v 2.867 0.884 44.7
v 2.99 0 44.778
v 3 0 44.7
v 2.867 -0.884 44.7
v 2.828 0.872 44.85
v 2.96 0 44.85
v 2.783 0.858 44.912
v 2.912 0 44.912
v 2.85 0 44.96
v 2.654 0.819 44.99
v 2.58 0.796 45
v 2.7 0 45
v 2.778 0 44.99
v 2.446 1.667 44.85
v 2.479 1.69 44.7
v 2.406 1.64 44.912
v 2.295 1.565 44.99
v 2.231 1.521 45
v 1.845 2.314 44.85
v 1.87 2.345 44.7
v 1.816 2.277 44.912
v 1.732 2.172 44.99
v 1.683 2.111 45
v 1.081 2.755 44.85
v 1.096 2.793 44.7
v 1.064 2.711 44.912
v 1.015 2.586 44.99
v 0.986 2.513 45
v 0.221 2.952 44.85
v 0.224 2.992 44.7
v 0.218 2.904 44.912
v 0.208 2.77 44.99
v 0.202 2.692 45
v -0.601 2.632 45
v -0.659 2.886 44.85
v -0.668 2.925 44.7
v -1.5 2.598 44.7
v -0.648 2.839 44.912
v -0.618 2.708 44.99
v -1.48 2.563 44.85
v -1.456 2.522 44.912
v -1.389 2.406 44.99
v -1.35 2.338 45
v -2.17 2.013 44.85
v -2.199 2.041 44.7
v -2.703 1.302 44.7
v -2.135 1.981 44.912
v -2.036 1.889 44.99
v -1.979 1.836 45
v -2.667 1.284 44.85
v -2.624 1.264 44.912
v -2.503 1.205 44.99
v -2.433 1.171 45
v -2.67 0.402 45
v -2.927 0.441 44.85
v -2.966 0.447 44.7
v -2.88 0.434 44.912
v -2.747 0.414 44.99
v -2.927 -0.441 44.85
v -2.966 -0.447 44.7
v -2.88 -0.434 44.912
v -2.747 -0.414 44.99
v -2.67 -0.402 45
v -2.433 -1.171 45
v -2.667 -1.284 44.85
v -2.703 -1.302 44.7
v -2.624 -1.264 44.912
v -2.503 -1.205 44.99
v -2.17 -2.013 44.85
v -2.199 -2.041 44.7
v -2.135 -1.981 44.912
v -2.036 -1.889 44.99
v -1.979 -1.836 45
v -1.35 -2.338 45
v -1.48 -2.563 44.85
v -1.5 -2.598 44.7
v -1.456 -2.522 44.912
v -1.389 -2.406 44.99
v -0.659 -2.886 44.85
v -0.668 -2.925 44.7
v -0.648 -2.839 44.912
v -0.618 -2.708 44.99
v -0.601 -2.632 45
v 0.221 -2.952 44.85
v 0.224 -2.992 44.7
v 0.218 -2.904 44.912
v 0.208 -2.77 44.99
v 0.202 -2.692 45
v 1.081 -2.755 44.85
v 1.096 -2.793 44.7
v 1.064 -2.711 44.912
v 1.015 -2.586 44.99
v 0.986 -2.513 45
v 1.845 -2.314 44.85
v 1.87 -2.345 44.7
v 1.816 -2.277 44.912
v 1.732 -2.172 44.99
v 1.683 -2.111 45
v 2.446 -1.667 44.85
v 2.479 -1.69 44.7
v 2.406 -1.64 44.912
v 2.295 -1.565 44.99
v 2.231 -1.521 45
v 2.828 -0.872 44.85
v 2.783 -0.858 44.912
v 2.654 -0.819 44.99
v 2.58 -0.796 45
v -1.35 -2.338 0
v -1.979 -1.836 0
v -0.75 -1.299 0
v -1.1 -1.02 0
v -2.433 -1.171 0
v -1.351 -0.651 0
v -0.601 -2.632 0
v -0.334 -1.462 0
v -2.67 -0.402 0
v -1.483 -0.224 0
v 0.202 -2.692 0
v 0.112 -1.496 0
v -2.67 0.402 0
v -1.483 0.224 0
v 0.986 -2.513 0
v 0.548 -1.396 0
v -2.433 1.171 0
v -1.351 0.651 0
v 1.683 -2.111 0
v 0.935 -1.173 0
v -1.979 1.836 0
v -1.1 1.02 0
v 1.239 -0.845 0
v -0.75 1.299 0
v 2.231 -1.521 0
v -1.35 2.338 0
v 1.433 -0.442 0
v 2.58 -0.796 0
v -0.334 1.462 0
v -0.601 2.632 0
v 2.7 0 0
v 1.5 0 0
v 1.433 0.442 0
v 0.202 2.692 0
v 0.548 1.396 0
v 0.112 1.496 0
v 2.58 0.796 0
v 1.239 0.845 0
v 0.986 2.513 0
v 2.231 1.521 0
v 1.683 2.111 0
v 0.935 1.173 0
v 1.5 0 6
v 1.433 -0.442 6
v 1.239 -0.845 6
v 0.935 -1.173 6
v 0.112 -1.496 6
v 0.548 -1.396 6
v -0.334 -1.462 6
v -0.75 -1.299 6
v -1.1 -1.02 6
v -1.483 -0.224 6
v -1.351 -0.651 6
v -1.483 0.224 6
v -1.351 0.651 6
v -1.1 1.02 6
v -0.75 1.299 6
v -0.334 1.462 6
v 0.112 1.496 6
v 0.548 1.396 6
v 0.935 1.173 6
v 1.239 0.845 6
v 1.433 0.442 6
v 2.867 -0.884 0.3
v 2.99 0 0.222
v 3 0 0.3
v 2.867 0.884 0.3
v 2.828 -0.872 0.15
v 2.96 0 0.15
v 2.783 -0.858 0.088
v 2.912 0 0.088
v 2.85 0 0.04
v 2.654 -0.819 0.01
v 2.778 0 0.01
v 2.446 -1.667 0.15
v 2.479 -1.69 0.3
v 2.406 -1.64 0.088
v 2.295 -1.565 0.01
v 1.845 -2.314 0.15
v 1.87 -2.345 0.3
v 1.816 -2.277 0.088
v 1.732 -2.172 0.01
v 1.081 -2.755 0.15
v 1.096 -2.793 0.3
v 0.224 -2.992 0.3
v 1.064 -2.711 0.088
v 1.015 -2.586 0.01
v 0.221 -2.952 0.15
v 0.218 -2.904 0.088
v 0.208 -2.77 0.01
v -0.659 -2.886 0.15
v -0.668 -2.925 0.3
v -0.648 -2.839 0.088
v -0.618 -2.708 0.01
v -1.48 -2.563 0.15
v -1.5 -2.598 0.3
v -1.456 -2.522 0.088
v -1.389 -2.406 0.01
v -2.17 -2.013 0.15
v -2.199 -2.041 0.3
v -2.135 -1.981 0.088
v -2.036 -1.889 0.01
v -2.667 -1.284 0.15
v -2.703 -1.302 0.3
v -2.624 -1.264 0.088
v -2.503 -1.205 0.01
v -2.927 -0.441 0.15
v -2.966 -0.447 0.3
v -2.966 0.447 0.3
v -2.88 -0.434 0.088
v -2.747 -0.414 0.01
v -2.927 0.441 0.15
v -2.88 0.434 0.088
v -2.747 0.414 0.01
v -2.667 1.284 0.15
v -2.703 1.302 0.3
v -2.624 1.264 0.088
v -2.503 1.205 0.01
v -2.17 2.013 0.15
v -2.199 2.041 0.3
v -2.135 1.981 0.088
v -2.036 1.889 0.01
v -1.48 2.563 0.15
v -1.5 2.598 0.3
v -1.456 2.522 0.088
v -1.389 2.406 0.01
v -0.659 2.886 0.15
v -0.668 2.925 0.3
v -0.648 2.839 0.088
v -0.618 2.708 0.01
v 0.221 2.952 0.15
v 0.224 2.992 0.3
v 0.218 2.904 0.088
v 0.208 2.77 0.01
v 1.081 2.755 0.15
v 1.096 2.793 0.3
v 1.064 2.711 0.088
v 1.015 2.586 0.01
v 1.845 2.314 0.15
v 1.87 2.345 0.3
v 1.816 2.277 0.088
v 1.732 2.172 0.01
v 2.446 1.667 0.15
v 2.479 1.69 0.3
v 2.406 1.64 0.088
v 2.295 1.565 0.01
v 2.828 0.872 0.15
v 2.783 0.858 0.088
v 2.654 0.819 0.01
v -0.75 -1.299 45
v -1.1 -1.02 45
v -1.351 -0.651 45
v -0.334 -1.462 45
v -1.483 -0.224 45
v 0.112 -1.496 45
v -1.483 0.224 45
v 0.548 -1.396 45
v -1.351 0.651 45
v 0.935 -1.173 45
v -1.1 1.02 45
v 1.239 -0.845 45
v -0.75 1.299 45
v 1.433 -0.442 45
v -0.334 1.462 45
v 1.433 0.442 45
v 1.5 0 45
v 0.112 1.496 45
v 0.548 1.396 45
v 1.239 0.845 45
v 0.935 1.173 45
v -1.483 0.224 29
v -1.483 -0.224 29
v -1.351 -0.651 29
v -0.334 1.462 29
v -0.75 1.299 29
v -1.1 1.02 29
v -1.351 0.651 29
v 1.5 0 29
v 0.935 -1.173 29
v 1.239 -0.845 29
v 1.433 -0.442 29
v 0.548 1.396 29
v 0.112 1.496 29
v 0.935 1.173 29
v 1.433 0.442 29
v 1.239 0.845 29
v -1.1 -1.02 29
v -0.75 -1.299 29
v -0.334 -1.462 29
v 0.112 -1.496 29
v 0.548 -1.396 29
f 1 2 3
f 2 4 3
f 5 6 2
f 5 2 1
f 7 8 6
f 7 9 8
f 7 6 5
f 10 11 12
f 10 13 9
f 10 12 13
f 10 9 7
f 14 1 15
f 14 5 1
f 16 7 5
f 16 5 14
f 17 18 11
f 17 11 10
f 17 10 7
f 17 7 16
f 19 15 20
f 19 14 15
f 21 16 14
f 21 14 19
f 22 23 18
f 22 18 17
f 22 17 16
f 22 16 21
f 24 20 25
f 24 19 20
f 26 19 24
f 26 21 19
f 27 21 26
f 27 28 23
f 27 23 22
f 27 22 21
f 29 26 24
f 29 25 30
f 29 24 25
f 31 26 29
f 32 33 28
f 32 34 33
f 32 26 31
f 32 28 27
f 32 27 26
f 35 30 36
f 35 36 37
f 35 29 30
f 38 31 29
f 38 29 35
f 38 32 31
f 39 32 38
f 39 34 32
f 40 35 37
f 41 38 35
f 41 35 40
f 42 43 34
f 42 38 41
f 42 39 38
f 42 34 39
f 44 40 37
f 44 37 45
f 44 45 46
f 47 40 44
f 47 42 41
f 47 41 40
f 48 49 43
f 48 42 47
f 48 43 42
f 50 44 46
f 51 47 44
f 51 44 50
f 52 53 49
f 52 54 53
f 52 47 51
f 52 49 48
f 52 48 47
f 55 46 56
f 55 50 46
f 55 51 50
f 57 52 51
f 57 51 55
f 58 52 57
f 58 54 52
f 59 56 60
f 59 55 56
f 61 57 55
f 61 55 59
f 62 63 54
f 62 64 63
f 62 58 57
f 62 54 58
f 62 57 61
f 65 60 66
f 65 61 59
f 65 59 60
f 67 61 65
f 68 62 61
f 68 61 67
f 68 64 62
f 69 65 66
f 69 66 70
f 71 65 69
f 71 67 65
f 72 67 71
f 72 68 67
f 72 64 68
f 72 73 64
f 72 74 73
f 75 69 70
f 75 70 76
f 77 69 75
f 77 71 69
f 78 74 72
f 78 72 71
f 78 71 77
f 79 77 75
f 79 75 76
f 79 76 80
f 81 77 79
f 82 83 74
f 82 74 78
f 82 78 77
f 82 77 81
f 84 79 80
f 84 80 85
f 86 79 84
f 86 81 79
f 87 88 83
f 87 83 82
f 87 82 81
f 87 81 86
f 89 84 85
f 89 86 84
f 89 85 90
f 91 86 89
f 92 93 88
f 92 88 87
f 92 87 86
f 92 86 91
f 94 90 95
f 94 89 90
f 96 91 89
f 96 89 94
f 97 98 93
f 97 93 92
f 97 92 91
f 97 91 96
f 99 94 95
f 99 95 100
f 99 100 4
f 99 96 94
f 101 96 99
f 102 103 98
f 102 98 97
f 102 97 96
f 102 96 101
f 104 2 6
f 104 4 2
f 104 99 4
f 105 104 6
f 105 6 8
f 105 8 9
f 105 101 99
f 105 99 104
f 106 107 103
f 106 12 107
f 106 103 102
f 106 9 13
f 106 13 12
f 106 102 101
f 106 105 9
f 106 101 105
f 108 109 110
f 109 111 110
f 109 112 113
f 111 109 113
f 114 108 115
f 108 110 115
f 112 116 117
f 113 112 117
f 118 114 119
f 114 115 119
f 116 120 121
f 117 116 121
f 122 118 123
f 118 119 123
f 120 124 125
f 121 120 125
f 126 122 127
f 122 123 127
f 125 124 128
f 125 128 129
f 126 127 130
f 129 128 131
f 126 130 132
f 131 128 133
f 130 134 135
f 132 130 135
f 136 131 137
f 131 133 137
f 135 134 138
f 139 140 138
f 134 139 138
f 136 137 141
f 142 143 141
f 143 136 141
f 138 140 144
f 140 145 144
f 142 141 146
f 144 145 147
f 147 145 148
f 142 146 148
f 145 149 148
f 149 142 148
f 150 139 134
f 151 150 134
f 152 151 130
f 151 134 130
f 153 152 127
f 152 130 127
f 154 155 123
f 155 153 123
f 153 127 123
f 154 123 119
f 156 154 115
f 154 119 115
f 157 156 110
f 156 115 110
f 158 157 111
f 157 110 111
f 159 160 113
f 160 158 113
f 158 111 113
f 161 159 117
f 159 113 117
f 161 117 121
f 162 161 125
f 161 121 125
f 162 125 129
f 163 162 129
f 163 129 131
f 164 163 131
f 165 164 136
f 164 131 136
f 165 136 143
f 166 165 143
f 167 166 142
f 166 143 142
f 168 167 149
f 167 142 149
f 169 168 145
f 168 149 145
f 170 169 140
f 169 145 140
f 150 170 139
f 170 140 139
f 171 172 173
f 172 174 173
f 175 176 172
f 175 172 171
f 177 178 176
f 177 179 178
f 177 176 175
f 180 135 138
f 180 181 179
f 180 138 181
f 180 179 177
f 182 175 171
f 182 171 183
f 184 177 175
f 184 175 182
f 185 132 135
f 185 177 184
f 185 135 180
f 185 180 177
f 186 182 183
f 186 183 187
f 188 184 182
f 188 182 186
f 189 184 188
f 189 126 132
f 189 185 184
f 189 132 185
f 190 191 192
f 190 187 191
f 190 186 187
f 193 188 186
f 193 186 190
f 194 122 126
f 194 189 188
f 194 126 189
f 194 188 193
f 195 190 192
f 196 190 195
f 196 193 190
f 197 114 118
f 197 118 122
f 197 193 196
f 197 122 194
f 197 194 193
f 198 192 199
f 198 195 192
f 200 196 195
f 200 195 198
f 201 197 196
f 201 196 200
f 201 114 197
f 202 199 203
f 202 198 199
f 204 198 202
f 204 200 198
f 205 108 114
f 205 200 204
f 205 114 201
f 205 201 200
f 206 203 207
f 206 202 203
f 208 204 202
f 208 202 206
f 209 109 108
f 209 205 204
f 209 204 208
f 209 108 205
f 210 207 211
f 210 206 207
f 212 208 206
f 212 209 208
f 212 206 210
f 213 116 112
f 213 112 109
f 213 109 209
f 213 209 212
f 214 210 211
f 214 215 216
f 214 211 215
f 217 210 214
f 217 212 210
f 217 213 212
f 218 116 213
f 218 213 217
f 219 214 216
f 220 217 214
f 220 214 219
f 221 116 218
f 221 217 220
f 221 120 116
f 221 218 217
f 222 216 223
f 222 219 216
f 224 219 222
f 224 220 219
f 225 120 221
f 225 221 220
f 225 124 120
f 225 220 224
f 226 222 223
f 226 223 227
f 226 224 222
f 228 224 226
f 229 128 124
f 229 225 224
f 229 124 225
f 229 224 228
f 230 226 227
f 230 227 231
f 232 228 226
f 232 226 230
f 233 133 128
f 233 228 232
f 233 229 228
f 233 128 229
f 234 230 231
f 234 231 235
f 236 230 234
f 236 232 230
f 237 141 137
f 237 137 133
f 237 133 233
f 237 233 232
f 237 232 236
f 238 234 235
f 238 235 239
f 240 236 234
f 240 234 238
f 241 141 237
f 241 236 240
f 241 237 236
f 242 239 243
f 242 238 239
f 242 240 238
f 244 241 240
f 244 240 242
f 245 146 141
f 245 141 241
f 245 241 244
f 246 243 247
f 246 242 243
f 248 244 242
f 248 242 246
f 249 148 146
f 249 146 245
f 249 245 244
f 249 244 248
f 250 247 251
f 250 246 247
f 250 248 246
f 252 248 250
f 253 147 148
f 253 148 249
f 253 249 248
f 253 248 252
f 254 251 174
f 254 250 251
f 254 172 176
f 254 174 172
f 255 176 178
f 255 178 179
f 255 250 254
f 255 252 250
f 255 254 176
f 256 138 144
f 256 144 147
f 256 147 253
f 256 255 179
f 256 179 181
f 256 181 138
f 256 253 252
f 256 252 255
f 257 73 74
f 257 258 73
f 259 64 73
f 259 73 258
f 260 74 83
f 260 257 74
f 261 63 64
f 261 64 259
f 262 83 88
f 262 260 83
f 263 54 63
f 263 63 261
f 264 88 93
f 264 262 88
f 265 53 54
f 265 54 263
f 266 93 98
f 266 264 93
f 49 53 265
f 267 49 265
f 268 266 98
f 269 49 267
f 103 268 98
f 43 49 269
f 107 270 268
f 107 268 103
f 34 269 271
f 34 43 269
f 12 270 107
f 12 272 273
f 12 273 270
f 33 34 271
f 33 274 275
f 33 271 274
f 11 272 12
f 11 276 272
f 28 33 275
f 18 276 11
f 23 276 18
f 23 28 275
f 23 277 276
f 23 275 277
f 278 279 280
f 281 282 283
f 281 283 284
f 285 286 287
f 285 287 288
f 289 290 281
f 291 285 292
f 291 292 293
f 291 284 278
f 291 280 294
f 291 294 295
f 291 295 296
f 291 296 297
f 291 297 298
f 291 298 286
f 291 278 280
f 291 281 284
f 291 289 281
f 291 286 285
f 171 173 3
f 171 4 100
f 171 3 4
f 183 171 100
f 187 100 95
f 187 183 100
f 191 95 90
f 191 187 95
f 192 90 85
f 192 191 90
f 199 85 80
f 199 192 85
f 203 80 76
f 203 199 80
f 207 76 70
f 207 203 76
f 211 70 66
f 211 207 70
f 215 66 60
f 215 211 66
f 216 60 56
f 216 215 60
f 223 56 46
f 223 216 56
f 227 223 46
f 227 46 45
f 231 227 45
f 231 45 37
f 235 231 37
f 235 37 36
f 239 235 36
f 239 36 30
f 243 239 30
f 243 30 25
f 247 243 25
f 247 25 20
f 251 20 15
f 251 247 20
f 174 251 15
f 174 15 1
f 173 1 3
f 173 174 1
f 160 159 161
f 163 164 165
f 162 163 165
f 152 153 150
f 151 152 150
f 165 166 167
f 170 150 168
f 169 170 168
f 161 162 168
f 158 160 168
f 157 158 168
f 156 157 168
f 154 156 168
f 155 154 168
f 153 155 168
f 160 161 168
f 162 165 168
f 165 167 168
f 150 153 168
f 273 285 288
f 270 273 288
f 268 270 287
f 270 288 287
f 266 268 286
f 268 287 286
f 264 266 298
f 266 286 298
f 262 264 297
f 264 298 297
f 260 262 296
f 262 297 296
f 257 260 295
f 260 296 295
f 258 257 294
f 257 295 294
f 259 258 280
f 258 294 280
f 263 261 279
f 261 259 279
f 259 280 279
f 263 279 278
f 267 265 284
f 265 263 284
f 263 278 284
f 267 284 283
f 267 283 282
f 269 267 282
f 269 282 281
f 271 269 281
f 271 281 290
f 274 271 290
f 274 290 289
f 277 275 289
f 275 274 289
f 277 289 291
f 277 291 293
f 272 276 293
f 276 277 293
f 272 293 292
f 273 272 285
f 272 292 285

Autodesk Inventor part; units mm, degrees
ref_plane "YZ Plane" through (0, 0, 0) normal (1, 0, 0) x (0, 1, 0)
ref_plane "XZ Plane" through (0, 0, 0) normal (0, 1, 0) x (-1, 0, 0)
ref_plane "XY Plane" through (0, 0, 0) normal (0, 0, 1) x (1, 0, 0)
sketch "スケッチ1" plane through (0, 0, 0) normal (0, 0, 1) x (1, 0, 0)
  circle A0 centre (0, 0) radius 3
  circle A1 centre (0, 0) radius 1.5
  dimension "d0" = 6
  dimension "d1" = 3
extrude "押し出し1" add sketch "スケッチ1" along normal blind 45
fillet "フィレット1" radius 0.3 2 edges at (-3, 0, 45) (-3, 0, 0)
thread "ねじ1" size "M3x0.5" class "6H" standard "ANSI Metric M Profile" length 100
extrude "押し出し2" add sketch "スケッチ1" along normal blind 29 contours A1
extrude "押し出し3" cut sketch "スケッチ1" along normal blind 6 contours A1
thread "ねじ2" size "M3x0.5" class "6H" standard "ANSI Metric M Profile" full length
properties part number "スペーサーM3L45アルミ" material "アルミニウム 2014-T4"
